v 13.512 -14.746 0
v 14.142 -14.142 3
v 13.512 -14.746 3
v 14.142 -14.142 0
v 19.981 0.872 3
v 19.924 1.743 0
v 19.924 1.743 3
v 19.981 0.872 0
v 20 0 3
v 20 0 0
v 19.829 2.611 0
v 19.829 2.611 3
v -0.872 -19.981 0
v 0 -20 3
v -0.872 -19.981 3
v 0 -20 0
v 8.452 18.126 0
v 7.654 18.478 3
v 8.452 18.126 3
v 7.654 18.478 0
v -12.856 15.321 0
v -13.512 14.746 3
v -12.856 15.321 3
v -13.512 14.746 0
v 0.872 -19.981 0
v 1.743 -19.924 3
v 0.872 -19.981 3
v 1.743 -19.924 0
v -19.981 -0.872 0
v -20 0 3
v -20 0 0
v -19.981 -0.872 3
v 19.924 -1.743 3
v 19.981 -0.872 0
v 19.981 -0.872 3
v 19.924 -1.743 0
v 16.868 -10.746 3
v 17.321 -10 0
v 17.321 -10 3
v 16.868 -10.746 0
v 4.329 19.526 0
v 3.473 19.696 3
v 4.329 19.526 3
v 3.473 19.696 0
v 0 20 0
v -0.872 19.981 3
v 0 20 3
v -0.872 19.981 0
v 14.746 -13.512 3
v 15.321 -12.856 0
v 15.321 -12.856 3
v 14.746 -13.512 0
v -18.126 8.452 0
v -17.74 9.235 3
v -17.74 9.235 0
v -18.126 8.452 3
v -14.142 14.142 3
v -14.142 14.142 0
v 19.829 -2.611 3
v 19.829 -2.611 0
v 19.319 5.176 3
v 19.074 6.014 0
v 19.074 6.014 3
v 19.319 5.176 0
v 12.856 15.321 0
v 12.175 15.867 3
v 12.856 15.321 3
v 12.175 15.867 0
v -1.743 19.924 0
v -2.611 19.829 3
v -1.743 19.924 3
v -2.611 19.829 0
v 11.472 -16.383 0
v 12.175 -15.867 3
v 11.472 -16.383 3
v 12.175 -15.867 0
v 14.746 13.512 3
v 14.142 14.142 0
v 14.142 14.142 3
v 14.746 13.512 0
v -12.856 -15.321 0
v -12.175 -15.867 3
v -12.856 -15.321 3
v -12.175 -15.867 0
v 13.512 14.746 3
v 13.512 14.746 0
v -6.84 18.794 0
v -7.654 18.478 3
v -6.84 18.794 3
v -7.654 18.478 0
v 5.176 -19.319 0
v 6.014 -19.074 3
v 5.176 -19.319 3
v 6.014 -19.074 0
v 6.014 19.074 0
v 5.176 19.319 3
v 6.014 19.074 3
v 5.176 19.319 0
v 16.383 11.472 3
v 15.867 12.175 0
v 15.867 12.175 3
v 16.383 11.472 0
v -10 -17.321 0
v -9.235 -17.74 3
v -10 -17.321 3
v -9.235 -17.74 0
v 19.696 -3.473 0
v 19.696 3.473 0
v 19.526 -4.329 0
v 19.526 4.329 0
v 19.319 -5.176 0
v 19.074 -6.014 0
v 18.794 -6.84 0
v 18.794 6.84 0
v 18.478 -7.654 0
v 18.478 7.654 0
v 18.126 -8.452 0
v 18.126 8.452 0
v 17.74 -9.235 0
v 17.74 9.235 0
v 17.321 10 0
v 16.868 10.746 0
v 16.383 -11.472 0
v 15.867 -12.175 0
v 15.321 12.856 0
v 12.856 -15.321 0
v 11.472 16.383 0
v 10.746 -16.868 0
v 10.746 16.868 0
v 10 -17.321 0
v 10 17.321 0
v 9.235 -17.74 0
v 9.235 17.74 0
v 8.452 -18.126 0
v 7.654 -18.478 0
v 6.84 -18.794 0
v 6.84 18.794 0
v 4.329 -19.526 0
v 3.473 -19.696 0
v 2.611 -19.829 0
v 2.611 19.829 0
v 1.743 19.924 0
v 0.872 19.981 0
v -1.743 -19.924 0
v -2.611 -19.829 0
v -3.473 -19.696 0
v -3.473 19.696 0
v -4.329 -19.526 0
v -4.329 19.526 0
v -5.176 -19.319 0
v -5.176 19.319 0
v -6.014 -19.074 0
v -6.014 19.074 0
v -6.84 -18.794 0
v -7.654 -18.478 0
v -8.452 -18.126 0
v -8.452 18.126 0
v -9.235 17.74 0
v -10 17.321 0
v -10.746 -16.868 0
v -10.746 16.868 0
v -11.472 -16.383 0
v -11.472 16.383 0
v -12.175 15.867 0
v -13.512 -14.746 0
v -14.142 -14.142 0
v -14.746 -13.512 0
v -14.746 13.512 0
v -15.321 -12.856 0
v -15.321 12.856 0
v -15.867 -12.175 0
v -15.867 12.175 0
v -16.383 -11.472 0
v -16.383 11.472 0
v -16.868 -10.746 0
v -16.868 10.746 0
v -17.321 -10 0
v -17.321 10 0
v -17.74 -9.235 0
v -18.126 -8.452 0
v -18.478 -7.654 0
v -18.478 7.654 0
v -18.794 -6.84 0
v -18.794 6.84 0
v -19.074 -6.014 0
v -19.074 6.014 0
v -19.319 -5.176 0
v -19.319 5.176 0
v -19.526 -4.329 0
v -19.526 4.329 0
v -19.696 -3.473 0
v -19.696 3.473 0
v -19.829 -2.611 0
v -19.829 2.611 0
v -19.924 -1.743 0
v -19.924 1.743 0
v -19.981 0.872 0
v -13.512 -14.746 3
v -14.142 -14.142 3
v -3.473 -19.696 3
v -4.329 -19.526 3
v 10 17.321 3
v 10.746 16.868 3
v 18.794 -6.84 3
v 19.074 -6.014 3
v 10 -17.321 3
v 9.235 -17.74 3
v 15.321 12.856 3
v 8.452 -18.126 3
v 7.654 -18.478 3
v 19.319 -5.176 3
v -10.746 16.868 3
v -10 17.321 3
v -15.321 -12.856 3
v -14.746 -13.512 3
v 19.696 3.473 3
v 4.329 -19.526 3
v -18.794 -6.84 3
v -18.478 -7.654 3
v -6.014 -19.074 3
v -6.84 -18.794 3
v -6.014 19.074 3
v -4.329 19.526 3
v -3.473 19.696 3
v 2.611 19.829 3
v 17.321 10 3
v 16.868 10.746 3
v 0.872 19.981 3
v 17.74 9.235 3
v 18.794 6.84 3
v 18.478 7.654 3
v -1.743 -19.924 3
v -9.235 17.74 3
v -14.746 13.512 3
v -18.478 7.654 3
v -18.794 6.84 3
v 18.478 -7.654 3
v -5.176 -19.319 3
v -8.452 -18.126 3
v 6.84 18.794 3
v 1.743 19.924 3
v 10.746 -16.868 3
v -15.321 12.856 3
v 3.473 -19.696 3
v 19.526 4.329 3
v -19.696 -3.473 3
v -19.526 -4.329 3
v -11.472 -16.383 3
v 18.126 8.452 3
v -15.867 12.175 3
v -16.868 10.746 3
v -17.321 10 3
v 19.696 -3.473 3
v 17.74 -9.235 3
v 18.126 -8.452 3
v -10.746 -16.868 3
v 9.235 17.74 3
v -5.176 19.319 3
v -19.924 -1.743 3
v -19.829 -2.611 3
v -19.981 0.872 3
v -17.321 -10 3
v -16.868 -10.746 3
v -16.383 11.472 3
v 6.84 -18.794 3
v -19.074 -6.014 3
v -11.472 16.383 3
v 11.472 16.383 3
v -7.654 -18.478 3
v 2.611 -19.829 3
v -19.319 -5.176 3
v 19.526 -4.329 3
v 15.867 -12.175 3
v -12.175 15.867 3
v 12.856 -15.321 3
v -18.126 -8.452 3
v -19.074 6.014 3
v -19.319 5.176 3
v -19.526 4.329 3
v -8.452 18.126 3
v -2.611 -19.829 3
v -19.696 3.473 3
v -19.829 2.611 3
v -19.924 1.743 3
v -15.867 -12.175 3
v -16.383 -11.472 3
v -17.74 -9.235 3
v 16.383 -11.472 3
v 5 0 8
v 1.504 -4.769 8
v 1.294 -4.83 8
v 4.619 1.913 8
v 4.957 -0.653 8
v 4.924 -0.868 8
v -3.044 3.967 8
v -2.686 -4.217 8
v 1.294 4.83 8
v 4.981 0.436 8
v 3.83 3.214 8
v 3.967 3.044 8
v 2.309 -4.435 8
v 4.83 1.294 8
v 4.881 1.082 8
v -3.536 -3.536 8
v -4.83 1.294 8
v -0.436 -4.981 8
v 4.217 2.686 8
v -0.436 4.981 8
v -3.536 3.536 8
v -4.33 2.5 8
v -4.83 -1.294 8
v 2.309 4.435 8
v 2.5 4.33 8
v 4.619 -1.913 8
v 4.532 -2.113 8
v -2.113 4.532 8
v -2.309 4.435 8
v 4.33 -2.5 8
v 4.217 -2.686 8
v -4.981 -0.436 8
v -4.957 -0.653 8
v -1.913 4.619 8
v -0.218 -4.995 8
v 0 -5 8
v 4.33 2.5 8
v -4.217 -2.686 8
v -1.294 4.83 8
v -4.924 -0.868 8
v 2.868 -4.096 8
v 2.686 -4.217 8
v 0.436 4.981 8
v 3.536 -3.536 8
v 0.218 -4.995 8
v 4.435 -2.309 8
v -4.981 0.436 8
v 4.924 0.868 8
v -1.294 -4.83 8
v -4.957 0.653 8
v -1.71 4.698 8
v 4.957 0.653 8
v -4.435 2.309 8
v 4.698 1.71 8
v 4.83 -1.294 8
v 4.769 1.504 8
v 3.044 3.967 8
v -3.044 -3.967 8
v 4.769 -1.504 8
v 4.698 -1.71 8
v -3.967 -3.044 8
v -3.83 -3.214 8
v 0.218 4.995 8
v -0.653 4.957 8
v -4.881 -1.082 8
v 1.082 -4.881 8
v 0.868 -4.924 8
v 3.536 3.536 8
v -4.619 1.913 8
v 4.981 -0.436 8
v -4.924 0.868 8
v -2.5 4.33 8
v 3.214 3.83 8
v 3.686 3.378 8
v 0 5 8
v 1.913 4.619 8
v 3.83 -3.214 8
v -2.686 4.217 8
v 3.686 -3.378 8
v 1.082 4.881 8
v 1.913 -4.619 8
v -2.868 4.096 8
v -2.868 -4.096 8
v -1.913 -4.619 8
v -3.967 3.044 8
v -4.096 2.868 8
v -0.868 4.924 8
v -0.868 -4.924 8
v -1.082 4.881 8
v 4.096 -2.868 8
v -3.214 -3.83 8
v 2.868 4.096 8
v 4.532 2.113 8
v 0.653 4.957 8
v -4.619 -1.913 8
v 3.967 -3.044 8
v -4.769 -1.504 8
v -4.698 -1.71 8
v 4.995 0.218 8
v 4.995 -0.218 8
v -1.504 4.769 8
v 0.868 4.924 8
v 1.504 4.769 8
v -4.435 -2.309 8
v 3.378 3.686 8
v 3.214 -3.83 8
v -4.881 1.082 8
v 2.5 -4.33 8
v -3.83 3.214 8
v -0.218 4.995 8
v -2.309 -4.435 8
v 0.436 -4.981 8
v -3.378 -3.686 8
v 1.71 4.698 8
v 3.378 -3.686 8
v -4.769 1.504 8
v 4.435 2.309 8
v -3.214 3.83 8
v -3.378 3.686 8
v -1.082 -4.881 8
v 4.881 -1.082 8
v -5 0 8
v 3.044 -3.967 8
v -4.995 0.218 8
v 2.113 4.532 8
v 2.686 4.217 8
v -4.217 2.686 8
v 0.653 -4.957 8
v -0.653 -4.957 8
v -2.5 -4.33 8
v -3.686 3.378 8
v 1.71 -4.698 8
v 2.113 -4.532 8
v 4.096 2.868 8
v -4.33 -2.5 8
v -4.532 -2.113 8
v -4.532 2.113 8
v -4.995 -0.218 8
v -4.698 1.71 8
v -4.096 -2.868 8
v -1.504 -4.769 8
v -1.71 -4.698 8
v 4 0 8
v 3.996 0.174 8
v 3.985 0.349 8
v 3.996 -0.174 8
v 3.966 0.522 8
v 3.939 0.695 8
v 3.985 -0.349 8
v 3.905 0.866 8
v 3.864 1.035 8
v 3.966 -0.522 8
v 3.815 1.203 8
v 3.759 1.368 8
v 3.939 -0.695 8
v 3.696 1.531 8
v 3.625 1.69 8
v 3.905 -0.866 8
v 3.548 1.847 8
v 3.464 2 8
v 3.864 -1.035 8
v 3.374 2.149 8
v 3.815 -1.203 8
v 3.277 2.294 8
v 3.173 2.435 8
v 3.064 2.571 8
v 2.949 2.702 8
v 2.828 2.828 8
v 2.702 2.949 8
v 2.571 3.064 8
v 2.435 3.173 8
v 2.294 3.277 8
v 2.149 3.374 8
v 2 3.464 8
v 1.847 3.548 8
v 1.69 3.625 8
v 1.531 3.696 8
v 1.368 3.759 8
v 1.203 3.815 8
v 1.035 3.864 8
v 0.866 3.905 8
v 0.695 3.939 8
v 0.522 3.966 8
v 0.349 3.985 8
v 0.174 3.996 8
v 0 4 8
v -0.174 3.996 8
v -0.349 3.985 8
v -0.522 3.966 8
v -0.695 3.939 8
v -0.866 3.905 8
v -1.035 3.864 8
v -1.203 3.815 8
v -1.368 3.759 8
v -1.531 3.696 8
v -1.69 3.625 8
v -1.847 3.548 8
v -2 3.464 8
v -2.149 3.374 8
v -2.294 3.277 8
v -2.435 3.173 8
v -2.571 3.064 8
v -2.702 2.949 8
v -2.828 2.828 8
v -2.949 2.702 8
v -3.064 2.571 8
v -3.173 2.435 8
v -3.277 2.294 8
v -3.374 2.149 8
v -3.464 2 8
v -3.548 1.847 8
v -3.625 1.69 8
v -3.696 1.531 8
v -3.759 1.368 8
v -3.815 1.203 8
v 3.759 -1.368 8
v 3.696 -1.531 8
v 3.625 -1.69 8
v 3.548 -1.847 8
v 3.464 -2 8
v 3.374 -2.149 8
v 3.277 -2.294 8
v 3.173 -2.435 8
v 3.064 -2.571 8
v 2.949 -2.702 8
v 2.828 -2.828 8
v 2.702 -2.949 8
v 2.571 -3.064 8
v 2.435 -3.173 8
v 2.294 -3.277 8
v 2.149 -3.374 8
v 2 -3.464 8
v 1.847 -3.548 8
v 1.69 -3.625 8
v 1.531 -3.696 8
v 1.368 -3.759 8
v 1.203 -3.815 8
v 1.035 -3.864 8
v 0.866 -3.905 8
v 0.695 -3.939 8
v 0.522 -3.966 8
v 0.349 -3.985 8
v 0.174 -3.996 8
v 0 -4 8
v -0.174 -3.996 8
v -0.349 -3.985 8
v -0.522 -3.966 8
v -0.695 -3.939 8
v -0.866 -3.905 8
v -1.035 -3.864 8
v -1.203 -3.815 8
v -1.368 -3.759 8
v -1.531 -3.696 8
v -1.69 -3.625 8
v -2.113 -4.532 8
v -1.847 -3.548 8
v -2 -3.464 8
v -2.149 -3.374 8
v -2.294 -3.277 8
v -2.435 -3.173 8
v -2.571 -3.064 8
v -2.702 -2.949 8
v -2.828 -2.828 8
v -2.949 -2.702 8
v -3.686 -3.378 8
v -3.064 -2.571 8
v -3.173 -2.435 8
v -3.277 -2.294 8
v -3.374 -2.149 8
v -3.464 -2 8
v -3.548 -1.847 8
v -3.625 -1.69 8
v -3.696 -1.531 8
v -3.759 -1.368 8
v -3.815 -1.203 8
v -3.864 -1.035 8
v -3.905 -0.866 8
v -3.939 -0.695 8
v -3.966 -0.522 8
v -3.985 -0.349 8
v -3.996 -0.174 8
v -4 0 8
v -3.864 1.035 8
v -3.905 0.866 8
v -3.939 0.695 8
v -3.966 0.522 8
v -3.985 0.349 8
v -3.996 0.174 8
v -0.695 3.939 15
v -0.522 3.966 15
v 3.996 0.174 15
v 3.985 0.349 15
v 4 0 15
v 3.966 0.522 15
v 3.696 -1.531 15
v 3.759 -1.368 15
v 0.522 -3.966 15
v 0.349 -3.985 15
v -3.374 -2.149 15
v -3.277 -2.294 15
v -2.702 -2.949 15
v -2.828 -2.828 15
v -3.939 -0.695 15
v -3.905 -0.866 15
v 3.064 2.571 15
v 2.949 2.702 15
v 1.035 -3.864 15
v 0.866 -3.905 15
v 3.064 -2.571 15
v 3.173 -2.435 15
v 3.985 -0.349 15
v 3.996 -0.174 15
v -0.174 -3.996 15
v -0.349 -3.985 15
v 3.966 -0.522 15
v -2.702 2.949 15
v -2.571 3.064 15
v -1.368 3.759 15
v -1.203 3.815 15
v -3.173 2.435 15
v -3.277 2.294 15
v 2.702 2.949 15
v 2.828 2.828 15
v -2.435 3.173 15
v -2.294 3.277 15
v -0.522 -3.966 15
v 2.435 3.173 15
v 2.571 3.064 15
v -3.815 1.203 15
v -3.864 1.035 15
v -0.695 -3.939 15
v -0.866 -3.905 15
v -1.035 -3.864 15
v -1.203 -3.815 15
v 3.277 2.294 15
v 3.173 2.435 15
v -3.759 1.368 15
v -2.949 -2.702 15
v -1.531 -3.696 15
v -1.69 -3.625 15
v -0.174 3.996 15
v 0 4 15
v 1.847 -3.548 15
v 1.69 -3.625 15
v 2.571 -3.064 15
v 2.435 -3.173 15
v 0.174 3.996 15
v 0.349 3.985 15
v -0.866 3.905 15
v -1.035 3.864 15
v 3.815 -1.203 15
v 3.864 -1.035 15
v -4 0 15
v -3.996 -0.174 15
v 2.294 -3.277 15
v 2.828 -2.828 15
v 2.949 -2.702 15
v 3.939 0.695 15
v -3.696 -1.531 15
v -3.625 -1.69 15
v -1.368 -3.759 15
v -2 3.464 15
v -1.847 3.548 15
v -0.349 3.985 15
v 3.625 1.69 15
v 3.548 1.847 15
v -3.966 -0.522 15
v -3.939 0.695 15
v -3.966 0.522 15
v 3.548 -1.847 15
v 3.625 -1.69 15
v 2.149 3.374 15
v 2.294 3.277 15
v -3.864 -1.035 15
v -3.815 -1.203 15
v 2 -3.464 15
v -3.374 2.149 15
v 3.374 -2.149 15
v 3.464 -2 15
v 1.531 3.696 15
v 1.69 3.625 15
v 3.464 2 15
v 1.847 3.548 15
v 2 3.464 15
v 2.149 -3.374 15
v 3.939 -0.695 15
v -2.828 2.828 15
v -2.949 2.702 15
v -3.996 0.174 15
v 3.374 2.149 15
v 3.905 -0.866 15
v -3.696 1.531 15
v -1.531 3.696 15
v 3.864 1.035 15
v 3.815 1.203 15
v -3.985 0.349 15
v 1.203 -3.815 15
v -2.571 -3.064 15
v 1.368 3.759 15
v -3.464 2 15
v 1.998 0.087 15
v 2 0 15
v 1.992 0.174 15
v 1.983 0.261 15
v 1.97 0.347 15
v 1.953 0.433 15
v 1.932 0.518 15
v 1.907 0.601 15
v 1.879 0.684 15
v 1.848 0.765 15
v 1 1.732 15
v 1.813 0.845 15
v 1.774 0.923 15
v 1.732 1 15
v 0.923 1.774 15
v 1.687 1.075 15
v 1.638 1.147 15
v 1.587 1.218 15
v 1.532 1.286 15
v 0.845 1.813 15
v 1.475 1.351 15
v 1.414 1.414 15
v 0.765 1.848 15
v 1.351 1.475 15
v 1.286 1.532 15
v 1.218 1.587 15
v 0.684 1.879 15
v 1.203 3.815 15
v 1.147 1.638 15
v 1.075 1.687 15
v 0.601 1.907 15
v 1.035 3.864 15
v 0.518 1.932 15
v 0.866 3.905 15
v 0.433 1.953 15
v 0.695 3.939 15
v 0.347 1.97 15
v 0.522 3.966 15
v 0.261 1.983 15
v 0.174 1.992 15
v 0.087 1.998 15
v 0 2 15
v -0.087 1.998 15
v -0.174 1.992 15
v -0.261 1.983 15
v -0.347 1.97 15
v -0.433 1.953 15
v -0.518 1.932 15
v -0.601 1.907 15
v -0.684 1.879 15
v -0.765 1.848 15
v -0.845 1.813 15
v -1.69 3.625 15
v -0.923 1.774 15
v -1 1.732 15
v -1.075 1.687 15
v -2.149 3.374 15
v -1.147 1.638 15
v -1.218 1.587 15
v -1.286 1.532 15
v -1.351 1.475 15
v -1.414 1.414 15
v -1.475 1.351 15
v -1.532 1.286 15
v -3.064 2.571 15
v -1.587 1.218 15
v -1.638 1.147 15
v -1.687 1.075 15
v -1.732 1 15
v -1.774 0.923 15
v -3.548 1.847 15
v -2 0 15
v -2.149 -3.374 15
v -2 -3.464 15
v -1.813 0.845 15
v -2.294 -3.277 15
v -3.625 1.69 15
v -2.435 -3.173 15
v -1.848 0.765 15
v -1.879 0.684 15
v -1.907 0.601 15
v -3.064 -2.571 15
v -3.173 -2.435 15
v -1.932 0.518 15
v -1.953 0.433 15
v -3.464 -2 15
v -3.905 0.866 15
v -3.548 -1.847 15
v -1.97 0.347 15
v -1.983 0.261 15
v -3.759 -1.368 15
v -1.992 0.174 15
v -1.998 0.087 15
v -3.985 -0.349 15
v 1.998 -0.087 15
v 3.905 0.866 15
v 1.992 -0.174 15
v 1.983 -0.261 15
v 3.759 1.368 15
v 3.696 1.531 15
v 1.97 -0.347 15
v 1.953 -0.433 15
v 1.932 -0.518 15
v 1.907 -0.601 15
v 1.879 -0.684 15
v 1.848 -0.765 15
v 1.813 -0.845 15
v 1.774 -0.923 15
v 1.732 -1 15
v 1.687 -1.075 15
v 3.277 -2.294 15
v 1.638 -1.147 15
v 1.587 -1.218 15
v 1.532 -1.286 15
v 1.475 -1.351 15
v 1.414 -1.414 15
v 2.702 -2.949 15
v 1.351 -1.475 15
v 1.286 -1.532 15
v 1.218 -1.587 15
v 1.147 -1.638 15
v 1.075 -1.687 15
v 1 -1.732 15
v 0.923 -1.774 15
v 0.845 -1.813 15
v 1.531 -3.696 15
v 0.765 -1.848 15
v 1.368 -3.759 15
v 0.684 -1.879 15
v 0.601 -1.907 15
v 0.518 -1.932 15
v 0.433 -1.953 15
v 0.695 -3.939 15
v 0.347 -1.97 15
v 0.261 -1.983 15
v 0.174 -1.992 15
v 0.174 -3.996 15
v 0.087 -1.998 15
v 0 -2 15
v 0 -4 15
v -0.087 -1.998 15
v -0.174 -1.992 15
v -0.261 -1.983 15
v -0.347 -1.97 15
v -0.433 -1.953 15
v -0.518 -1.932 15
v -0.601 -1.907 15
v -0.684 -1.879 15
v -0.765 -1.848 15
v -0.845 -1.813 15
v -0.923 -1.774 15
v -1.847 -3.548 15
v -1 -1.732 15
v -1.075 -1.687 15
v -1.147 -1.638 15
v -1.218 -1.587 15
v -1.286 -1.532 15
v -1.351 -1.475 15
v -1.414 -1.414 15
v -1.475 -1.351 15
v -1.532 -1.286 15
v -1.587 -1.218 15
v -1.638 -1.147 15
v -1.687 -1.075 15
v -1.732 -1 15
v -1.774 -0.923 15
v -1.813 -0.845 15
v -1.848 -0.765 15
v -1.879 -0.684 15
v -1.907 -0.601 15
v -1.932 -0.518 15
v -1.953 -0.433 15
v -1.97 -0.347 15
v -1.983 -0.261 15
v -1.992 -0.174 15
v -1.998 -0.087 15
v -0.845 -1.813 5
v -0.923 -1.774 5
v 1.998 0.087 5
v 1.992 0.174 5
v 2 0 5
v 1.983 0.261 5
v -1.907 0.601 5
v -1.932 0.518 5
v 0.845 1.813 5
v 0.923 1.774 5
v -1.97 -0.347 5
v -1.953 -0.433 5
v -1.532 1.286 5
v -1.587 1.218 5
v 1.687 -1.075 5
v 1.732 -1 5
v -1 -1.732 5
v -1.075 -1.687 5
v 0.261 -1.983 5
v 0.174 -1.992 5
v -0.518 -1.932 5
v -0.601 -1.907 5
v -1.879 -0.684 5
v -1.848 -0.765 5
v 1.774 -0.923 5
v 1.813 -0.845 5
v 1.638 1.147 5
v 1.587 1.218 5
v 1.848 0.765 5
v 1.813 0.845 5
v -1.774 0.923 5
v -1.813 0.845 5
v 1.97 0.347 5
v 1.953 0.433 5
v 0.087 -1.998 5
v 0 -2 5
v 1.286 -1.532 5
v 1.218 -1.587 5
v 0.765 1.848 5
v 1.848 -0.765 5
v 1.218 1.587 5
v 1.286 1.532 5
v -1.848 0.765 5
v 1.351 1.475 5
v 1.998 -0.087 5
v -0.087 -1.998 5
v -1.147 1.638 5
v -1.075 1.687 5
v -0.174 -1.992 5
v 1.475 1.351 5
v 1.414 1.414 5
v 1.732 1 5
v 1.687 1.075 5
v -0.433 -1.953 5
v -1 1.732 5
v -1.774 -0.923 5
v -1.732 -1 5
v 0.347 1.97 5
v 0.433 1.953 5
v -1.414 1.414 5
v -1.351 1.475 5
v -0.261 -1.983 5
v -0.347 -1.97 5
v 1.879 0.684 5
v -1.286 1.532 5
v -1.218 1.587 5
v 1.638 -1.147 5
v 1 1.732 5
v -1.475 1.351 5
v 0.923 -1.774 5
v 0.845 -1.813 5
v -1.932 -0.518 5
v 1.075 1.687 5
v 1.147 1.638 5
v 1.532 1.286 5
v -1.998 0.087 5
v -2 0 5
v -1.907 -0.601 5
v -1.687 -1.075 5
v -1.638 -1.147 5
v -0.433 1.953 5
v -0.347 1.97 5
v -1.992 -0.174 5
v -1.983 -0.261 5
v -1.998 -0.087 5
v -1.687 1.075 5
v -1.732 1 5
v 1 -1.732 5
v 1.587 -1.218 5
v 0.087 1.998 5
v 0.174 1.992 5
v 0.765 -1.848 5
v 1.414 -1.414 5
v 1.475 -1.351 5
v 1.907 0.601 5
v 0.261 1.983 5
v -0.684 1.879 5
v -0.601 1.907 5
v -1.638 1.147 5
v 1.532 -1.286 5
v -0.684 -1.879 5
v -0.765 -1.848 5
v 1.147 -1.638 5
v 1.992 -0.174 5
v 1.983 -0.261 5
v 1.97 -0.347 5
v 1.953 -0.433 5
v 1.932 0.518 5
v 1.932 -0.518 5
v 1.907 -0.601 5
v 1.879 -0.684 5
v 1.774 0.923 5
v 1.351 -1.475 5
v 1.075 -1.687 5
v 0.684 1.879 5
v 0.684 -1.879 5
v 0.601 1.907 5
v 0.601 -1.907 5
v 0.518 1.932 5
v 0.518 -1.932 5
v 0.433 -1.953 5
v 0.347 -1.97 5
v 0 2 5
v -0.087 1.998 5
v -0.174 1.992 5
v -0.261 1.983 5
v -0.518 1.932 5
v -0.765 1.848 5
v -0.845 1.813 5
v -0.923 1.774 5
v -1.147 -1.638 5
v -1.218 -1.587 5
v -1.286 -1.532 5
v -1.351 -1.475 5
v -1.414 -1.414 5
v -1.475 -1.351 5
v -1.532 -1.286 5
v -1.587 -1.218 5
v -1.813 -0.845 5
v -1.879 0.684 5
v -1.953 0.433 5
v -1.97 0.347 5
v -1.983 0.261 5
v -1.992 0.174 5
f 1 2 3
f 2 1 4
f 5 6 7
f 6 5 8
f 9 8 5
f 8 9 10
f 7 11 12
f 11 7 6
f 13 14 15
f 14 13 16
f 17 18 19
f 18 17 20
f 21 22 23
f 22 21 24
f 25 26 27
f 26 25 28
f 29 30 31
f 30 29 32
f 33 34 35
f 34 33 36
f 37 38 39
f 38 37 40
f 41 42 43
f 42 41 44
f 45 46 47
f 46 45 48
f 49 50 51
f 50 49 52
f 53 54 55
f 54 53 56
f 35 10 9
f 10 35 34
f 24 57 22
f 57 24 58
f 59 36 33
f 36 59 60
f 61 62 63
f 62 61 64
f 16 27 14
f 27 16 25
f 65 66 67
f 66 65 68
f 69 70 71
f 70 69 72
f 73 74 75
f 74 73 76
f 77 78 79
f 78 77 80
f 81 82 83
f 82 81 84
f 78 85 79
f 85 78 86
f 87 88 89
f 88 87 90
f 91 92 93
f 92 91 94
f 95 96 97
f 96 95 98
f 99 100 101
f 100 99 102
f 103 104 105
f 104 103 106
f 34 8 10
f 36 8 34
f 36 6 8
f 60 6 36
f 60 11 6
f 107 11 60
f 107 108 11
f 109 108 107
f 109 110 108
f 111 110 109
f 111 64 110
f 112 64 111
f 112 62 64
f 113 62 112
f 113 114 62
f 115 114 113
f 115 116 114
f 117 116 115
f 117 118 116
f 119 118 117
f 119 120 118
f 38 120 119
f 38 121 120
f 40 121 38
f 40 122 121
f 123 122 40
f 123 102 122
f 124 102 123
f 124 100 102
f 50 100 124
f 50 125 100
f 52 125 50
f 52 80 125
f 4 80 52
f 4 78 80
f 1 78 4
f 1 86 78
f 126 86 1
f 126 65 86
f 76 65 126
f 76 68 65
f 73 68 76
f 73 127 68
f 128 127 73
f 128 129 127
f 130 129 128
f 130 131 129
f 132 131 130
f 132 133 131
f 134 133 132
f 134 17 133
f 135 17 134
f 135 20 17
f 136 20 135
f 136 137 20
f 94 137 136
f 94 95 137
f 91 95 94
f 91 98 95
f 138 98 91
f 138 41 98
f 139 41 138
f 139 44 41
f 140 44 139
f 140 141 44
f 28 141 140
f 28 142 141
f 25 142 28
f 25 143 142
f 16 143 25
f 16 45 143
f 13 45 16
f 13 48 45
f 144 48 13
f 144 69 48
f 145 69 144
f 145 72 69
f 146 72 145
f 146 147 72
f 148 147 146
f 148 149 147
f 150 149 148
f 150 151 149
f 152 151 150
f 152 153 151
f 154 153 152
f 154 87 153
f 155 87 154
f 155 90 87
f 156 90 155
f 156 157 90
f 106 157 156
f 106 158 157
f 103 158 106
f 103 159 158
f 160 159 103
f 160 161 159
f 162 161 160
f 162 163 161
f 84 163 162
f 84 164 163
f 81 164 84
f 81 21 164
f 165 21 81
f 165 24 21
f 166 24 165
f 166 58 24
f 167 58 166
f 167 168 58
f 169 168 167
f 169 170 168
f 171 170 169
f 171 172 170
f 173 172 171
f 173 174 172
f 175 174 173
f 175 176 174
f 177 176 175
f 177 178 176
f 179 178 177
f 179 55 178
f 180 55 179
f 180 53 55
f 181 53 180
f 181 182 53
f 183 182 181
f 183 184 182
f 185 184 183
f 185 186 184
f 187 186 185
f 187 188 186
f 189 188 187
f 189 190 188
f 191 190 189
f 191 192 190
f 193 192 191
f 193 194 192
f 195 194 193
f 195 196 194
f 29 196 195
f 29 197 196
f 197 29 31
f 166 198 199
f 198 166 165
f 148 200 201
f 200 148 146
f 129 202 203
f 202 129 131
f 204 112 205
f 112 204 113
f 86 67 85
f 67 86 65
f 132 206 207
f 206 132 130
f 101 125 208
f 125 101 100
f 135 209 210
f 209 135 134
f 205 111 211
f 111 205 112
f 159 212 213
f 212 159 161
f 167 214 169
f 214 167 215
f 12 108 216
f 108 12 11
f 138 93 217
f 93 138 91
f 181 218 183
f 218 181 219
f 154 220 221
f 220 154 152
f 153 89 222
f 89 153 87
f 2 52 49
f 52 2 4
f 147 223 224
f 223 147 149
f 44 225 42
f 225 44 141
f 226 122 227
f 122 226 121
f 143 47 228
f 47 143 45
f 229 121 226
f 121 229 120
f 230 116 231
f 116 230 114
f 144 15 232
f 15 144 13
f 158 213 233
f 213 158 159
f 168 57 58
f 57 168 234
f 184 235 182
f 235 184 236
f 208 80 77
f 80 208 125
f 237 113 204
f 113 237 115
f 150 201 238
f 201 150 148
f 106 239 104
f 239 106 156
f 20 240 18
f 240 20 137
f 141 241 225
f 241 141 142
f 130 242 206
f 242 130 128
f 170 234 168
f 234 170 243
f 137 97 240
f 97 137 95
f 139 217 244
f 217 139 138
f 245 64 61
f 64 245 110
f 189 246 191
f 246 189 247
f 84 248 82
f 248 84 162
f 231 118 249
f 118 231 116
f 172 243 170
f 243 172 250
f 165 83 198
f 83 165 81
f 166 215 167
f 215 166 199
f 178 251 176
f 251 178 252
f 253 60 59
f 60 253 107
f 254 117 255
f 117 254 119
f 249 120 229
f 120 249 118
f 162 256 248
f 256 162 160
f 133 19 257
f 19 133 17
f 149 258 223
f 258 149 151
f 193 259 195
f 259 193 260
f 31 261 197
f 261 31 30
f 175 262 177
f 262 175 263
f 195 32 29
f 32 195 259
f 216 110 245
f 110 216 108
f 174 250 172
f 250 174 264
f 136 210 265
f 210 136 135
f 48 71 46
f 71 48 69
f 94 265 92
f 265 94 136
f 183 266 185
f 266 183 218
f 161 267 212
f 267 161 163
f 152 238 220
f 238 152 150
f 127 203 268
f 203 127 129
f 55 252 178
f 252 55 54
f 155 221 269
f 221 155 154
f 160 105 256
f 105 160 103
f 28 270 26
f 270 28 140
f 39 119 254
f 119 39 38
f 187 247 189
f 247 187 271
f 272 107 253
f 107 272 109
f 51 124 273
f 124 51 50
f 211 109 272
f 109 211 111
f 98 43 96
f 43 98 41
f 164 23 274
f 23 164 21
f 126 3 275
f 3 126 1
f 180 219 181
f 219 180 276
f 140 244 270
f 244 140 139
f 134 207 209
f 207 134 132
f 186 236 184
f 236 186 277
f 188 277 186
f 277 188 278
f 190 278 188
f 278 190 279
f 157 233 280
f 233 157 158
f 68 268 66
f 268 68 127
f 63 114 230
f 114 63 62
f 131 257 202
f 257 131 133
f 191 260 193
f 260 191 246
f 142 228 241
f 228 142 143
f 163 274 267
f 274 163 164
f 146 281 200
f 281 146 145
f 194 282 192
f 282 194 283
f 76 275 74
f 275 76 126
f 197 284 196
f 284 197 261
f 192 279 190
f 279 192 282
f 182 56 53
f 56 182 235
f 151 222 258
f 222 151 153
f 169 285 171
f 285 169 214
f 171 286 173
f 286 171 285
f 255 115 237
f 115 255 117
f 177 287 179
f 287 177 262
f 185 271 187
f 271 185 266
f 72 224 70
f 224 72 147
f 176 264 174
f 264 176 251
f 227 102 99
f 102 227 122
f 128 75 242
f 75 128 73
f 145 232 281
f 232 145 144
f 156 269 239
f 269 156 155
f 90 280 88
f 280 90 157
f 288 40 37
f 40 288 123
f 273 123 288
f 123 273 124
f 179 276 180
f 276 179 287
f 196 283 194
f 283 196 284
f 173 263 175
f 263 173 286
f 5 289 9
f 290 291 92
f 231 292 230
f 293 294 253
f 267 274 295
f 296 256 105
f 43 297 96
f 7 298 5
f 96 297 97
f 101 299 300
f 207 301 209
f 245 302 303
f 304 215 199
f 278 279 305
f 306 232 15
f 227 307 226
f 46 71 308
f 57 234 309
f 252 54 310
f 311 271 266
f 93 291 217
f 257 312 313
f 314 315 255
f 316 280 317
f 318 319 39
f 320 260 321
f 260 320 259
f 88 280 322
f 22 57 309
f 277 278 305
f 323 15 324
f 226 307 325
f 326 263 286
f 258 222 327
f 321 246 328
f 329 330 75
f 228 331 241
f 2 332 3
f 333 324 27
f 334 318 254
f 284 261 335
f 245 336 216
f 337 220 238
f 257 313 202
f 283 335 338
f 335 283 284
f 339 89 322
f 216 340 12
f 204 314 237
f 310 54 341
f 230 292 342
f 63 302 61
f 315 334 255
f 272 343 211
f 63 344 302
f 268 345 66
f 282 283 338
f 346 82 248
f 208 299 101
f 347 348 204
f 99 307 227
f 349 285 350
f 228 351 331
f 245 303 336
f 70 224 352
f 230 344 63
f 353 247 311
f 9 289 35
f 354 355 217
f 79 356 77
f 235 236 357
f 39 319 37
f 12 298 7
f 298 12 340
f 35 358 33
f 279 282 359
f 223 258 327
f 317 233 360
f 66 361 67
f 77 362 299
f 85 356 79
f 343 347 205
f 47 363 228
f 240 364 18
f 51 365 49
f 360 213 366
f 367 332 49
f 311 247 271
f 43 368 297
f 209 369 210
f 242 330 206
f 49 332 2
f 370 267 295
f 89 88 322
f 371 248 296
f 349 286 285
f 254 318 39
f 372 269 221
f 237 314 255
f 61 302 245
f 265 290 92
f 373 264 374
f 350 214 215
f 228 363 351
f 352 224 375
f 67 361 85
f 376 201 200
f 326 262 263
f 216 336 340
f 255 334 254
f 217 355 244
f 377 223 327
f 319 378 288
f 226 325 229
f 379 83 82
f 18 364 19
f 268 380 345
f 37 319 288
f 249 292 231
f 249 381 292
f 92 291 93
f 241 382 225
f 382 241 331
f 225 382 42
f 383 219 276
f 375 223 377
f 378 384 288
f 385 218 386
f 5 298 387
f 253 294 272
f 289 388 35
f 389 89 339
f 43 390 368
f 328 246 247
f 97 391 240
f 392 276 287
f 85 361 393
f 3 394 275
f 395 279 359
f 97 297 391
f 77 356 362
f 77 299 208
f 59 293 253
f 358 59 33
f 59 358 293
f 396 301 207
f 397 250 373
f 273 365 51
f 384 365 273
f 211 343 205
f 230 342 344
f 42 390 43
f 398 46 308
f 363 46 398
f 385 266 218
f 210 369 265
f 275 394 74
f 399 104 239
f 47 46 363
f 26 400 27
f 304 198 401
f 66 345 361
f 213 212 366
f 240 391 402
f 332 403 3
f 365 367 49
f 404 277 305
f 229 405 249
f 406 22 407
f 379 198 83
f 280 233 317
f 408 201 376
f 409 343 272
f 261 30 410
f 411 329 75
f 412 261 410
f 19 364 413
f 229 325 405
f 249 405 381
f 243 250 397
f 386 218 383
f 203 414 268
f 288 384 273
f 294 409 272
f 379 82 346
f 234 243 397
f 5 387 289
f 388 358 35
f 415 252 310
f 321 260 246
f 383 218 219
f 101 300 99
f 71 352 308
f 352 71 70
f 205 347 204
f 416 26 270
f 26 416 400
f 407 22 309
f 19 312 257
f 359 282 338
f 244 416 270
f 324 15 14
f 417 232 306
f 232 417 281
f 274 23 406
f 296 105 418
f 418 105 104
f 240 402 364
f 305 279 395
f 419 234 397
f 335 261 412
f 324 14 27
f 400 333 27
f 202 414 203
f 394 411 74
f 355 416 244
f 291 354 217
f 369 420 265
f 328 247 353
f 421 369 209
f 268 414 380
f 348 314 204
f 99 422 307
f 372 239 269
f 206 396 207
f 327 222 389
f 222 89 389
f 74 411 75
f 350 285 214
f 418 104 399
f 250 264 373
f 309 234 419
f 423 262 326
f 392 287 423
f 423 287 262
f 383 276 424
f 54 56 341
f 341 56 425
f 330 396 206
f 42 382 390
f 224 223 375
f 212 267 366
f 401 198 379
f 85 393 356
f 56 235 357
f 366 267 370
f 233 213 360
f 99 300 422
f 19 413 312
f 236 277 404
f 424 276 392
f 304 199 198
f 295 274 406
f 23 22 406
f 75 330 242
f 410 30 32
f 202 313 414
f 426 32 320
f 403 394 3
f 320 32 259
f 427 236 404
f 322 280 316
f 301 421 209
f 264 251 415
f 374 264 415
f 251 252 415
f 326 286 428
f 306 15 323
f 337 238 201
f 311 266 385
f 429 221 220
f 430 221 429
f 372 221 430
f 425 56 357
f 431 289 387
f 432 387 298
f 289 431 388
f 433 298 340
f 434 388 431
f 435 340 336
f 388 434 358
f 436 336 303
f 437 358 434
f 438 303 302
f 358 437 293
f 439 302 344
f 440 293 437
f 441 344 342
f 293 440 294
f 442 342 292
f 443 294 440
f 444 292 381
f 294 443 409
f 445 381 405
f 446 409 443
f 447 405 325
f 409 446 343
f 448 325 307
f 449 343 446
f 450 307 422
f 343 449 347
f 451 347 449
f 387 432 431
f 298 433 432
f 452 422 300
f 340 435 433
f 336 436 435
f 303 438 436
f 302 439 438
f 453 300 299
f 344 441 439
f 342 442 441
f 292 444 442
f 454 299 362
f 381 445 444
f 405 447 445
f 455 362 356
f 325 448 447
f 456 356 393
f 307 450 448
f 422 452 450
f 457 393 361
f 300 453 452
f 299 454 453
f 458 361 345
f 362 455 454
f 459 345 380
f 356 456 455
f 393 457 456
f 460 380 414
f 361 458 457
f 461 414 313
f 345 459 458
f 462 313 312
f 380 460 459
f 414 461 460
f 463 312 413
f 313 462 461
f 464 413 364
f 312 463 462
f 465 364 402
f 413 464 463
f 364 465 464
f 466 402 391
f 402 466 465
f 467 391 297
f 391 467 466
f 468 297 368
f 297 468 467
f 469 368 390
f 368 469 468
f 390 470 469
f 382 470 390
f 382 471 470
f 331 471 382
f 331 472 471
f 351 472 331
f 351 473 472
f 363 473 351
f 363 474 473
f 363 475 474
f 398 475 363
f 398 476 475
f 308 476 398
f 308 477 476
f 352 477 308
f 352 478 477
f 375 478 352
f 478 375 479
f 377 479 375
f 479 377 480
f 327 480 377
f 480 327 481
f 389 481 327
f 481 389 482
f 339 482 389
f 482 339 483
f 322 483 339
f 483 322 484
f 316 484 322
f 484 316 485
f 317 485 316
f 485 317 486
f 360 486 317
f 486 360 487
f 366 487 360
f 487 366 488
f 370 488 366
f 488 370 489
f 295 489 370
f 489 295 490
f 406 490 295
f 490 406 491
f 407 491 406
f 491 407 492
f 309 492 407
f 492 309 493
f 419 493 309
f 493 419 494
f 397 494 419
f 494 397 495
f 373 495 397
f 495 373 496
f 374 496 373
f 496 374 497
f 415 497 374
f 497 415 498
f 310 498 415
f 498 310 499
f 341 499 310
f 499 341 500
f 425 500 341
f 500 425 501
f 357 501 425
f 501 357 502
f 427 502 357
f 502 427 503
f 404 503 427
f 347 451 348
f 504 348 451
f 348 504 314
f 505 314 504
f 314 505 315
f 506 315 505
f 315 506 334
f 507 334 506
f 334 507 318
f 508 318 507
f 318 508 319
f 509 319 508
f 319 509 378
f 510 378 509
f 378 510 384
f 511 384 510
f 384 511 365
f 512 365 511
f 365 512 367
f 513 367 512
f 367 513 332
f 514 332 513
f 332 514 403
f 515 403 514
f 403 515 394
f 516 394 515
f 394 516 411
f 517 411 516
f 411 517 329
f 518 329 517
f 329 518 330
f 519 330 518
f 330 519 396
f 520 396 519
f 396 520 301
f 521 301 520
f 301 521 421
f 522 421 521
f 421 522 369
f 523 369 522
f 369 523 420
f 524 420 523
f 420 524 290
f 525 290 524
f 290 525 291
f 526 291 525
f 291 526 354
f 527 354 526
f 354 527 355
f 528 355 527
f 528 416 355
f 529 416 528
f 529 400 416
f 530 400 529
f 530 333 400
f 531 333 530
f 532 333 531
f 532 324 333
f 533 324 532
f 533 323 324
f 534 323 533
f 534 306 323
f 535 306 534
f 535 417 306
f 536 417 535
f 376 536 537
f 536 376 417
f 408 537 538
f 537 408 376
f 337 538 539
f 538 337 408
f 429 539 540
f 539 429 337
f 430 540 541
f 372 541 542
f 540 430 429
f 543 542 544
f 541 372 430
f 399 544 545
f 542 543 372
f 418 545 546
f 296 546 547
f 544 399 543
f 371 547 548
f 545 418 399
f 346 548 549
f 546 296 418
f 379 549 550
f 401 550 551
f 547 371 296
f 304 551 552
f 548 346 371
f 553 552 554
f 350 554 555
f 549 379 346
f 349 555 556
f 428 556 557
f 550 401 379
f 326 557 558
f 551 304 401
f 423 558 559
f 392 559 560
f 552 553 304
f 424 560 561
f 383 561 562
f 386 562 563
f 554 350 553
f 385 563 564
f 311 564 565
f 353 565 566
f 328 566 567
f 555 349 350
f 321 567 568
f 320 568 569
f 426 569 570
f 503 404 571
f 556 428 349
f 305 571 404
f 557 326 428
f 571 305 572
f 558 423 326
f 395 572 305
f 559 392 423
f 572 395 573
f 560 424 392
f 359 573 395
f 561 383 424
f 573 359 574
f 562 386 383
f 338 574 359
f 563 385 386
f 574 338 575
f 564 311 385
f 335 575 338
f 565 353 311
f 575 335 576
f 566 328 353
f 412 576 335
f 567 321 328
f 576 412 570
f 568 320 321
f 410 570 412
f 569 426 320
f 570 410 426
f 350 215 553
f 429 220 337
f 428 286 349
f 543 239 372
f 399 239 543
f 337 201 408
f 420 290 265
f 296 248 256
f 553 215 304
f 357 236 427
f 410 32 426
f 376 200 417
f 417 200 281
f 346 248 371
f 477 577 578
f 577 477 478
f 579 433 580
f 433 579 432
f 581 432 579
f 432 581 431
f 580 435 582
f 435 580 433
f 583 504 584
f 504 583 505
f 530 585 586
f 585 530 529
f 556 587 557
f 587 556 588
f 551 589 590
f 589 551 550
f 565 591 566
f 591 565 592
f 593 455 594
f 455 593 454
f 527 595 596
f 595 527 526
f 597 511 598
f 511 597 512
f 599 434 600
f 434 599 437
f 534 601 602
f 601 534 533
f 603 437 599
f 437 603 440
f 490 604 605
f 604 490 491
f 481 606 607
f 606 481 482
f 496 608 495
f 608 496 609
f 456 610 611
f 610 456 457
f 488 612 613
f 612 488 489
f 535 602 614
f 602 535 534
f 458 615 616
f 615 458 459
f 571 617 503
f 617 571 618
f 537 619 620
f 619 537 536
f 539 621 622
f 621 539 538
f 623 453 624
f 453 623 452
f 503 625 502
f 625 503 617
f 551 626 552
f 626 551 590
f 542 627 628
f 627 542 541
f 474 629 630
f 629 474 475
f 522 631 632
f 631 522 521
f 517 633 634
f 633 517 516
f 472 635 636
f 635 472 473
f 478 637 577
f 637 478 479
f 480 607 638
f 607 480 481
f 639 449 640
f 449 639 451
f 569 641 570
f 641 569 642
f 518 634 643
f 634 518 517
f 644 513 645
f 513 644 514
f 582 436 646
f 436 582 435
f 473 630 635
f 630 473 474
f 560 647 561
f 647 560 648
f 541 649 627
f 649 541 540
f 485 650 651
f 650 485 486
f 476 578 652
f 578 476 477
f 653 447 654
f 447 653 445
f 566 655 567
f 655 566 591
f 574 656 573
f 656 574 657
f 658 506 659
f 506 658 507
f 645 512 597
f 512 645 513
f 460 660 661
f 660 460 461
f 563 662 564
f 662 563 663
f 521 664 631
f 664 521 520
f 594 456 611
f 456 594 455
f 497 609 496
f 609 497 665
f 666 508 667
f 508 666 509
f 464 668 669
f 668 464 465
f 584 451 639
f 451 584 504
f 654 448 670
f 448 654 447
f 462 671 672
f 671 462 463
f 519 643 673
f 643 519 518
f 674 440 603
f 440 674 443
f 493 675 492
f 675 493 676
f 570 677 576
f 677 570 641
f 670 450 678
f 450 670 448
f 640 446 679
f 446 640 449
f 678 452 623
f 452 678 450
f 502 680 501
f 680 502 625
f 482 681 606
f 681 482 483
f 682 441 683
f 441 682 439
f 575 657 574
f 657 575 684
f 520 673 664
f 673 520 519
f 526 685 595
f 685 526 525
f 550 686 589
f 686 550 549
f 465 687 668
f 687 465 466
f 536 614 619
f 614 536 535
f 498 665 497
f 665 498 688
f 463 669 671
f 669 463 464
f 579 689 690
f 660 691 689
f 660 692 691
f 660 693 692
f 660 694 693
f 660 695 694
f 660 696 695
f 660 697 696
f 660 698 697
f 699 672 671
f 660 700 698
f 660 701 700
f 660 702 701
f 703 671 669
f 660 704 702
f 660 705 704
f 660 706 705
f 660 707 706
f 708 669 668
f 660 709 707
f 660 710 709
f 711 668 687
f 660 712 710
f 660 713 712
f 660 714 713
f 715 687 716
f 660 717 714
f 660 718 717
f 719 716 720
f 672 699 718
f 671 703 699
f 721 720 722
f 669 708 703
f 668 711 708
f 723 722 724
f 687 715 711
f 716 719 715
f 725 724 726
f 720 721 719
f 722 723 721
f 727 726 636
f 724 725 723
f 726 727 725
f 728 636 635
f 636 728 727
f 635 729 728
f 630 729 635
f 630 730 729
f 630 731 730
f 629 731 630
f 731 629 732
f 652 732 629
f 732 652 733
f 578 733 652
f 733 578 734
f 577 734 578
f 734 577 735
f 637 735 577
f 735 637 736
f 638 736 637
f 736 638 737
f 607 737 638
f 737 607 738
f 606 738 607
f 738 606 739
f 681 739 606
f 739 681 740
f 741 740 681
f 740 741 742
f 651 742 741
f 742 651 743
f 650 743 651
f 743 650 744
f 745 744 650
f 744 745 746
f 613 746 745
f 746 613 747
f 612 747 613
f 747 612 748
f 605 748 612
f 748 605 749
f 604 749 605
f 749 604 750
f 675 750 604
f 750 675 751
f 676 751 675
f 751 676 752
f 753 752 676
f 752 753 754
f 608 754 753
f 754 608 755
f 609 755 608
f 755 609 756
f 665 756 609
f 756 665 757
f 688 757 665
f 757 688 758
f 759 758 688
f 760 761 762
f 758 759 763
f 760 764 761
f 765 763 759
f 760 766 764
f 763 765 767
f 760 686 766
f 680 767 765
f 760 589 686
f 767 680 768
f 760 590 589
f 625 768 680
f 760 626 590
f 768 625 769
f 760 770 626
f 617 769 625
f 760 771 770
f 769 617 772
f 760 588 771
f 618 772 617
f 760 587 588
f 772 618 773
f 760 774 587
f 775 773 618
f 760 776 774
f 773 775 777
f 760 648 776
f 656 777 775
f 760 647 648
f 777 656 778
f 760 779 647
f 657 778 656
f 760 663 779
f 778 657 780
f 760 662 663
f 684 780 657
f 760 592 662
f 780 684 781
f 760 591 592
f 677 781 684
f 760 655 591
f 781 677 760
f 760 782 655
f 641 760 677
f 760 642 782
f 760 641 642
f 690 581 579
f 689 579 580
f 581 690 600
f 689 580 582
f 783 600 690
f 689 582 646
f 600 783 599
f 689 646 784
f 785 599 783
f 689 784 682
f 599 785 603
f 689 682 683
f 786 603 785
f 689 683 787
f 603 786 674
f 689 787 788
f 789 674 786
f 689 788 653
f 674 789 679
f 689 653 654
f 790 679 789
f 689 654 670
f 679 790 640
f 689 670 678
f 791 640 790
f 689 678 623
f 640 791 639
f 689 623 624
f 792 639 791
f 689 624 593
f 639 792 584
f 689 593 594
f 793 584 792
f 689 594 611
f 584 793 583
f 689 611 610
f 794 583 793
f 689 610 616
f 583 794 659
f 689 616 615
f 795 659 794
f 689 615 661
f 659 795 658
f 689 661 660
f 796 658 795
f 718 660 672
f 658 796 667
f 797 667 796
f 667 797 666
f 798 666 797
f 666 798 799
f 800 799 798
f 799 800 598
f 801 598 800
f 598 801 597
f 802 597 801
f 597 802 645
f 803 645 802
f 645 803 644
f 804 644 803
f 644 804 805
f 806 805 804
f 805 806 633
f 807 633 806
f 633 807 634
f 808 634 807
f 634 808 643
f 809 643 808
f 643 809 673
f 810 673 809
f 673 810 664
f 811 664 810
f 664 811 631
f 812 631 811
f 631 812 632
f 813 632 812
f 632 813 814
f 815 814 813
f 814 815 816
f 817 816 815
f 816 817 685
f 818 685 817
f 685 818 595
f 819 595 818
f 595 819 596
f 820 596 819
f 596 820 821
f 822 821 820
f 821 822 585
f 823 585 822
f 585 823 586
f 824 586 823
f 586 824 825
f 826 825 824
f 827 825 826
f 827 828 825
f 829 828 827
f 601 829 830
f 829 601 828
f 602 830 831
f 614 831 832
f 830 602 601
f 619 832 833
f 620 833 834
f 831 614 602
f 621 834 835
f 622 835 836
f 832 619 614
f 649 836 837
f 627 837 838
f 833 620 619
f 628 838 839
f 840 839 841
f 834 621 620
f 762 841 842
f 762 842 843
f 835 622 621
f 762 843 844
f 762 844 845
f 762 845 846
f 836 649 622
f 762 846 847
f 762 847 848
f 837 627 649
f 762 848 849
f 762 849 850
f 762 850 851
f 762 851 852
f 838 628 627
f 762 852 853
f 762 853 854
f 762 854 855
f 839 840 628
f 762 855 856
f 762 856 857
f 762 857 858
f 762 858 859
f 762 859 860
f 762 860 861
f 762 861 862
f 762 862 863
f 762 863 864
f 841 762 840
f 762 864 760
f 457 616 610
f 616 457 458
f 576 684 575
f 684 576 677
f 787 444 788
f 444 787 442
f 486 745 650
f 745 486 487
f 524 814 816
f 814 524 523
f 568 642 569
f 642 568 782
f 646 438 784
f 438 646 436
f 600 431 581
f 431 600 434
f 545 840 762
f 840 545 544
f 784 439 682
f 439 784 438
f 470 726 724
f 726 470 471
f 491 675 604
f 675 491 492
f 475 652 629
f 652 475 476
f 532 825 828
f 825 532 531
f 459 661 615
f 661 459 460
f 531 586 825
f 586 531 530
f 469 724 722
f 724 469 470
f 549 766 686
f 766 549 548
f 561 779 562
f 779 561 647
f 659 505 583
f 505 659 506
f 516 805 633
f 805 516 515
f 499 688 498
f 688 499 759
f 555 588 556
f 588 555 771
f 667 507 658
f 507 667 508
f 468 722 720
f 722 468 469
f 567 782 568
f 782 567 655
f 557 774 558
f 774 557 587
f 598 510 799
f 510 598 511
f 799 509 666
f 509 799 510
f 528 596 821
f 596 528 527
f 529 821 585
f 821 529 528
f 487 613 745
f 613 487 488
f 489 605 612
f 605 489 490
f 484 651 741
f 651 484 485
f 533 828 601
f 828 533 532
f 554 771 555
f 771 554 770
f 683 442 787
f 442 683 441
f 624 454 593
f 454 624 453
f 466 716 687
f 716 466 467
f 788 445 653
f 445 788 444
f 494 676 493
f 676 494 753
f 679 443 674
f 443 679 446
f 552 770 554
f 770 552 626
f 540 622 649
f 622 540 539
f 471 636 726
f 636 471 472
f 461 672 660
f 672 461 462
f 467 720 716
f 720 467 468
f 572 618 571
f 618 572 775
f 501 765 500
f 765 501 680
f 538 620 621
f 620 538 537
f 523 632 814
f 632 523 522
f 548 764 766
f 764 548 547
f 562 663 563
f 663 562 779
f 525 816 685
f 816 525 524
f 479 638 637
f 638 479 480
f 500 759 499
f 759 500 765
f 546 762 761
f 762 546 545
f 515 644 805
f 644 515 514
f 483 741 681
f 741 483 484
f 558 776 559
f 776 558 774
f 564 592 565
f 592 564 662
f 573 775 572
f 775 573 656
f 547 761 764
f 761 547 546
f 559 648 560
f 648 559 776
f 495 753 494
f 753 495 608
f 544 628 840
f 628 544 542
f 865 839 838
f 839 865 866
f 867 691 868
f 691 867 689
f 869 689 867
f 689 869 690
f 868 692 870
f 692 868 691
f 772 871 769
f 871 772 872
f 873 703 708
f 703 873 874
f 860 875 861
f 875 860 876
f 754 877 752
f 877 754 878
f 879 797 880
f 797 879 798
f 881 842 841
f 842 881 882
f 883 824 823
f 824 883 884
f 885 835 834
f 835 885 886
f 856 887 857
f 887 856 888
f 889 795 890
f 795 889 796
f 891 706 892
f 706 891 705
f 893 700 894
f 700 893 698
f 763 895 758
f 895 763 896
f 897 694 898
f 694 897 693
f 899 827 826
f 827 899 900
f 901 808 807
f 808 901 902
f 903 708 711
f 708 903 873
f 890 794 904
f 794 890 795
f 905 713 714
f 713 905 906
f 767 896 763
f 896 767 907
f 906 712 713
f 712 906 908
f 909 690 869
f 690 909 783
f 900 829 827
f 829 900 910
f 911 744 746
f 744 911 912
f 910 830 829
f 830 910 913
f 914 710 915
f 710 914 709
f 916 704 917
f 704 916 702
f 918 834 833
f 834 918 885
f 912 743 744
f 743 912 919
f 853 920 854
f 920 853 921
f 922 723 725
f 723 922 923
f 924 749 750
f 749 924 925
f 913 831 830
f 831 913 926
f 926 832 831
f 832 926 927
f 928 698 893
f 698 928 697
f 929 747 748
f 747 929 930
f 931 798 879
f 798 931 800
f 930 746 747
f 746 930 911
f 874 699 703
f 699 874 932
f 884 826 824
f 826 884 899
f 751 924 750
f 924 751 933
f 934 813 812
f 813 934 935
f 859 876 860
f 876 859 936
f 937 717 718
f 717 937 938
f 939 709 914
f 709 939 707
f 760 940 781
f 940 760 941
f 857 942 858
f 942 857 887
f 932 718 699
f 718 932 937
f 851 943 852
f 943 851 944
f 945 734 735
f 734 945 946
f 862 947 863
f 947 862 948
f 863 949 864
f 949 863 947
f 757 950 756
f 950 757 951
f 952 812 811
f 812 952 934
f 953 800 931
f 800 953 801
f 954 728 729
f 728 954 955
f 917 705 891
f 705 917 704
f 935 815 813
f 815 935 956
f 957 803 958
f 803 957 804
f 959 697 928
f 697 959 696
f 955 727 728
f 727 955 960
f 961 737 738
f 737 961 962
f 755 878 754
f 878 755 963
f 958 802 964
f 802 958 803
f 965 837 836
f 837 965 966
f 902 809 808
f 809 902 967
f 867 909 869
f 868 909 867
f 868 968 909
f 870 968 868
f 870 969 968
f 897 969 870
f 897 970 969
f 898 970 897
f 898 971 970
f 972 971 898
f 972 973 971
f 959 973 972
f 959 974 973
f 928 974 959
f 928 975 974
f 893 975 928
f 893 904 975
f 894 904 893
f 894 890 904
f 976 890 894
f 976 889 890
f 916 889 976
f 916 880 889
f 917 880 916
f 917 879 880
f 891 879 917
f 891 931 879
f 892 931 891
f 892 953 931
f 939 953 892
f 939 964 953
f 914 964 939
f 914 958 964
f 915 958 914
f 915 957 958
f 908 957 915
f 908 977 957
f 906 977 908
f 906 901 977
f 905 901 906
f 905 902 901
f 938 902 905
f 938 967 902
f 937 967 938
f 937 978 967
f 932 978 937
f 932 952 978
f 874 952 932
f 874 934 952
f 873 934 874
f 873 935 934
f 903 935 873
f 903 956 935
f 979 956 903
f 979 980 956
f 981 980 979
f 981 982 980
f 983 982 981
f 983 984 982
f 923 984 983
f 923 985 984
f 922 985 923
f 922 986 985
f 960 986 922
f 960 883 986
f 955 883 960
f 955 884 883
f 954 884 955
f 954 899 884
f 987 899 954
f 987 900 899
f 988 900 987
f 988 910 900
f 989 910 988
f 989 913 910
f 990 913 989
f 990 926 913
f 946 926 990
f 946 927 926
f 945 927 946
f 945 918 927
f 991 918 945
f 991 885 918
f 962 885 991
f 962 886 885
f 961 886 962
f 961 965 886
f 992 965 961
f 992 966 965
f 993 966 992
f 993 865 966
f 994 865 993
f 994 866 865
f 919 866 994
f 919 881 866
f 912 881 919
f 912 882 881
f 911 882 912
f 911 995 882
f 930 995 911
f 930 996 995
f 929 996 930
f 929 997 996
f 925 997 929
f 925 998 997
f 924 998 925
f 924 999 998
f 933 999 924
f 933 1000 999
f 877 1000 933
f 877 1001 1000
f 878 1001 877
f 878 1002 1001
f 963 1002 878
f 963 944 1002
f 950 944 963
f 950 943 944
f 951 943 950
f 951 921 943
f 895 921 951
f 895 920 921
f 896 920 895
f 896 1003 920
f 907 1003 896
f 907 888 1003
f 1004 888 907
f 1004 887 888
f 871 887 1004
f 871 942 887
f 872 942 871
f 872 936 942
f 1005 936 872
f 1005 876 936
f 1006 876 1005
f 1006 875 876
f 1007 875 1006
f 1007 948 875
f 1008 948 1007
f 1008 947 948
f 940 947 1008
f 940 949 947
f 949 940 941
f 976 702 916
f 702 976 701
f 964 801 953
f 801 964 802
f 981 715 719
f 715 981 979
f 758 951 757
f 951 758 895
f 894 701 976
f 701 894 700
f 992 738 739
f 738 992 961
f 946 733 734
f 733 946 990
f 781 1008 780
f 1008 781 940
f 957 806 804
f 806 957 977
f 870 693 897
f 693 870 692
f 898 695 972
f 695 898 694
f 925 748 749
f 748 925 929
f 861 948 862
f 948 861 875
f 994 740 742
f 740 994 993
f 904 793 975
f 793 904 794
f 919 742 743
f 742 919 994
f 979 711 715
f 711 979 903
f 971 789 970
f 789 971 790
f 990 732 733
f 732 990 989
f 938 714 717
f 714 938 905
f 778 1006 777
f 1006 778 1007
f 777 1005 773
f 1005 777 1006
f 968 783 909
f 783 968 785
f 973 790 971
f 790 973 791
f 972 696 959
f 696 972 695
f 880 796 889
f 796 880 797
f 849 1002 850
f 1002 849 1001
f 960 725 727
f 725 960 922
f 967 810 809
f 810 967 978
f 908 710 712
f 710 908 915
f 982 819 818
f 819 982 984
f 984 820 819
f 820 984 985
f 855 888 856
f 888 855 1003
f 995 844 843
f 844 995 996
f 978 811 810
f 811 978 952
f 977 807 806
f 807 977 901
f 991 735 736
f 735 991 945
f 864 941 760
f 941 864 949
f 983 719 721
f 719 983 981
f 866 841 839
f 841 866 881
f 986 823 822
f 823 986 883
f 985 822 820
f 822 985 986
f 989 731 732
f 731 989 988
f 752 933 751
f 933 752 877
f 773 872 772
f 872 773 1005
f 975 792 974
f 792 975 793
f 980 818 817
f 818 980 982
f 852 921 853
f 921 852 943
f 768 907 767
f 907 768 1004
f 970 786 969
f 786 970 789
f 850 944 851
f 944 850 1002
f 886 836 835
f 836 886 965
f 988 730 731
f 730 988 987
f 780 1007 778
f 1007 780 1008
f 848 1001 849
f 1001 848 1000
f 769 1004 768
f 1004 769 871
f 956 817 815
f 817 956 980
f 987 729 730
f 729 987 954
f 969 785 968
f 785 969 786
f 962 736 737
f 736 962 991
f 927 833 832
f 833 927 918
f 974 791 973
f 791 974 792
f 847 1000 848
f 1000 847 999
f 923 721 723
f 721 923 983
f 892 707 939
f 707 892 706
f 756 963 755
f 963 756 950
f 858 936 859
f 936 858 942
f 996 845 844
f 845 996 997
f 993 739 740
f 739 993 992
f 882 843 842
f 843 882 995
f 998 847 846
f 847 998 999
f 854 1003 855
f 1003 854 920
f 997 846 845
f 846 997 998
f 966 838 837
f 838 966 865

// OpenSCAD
$fn=144;
//Radius of the handle you will use as shaft
Handle_radius=2;
//Radius of the knob on the handle
Handle_knob_radius=5;
//Thickness and radius of the bottom
Bottom_radius=20;
Bottom_height=3;
//Thikness and radius of the conical part
Middle_radius=5;
Middle_height=5;
//0 to render the knob   1 to render the pressing part
Render_bottom=1;

if(Render_bottom==1)
difference()
    {
    union()
        {
        cylinder(r=Bottom_radius,h=Bottom_height);

        translate([0,0,Bottom_height])
        cylinder(r1=Bottom_radius,r2=Middle_radius,h=Middle_height);

        cylinder(r=Handle_radius+2,h=Bottom_height+Middle_height+7);
        }
    translate([0,0,5])
    cylinder(r=Handle_radius,h=100);
    }

if(Render_bottom==0)
difference()
    {
    union()
        {
        translate([0,0,Handle_knob_radius*2])
        scale([1,1,2])
        sphere(r=Handle_knob_radius);
        }
    translate([0,0,-1])
    cylinder(r=Handle_radius,h=100);
    }
